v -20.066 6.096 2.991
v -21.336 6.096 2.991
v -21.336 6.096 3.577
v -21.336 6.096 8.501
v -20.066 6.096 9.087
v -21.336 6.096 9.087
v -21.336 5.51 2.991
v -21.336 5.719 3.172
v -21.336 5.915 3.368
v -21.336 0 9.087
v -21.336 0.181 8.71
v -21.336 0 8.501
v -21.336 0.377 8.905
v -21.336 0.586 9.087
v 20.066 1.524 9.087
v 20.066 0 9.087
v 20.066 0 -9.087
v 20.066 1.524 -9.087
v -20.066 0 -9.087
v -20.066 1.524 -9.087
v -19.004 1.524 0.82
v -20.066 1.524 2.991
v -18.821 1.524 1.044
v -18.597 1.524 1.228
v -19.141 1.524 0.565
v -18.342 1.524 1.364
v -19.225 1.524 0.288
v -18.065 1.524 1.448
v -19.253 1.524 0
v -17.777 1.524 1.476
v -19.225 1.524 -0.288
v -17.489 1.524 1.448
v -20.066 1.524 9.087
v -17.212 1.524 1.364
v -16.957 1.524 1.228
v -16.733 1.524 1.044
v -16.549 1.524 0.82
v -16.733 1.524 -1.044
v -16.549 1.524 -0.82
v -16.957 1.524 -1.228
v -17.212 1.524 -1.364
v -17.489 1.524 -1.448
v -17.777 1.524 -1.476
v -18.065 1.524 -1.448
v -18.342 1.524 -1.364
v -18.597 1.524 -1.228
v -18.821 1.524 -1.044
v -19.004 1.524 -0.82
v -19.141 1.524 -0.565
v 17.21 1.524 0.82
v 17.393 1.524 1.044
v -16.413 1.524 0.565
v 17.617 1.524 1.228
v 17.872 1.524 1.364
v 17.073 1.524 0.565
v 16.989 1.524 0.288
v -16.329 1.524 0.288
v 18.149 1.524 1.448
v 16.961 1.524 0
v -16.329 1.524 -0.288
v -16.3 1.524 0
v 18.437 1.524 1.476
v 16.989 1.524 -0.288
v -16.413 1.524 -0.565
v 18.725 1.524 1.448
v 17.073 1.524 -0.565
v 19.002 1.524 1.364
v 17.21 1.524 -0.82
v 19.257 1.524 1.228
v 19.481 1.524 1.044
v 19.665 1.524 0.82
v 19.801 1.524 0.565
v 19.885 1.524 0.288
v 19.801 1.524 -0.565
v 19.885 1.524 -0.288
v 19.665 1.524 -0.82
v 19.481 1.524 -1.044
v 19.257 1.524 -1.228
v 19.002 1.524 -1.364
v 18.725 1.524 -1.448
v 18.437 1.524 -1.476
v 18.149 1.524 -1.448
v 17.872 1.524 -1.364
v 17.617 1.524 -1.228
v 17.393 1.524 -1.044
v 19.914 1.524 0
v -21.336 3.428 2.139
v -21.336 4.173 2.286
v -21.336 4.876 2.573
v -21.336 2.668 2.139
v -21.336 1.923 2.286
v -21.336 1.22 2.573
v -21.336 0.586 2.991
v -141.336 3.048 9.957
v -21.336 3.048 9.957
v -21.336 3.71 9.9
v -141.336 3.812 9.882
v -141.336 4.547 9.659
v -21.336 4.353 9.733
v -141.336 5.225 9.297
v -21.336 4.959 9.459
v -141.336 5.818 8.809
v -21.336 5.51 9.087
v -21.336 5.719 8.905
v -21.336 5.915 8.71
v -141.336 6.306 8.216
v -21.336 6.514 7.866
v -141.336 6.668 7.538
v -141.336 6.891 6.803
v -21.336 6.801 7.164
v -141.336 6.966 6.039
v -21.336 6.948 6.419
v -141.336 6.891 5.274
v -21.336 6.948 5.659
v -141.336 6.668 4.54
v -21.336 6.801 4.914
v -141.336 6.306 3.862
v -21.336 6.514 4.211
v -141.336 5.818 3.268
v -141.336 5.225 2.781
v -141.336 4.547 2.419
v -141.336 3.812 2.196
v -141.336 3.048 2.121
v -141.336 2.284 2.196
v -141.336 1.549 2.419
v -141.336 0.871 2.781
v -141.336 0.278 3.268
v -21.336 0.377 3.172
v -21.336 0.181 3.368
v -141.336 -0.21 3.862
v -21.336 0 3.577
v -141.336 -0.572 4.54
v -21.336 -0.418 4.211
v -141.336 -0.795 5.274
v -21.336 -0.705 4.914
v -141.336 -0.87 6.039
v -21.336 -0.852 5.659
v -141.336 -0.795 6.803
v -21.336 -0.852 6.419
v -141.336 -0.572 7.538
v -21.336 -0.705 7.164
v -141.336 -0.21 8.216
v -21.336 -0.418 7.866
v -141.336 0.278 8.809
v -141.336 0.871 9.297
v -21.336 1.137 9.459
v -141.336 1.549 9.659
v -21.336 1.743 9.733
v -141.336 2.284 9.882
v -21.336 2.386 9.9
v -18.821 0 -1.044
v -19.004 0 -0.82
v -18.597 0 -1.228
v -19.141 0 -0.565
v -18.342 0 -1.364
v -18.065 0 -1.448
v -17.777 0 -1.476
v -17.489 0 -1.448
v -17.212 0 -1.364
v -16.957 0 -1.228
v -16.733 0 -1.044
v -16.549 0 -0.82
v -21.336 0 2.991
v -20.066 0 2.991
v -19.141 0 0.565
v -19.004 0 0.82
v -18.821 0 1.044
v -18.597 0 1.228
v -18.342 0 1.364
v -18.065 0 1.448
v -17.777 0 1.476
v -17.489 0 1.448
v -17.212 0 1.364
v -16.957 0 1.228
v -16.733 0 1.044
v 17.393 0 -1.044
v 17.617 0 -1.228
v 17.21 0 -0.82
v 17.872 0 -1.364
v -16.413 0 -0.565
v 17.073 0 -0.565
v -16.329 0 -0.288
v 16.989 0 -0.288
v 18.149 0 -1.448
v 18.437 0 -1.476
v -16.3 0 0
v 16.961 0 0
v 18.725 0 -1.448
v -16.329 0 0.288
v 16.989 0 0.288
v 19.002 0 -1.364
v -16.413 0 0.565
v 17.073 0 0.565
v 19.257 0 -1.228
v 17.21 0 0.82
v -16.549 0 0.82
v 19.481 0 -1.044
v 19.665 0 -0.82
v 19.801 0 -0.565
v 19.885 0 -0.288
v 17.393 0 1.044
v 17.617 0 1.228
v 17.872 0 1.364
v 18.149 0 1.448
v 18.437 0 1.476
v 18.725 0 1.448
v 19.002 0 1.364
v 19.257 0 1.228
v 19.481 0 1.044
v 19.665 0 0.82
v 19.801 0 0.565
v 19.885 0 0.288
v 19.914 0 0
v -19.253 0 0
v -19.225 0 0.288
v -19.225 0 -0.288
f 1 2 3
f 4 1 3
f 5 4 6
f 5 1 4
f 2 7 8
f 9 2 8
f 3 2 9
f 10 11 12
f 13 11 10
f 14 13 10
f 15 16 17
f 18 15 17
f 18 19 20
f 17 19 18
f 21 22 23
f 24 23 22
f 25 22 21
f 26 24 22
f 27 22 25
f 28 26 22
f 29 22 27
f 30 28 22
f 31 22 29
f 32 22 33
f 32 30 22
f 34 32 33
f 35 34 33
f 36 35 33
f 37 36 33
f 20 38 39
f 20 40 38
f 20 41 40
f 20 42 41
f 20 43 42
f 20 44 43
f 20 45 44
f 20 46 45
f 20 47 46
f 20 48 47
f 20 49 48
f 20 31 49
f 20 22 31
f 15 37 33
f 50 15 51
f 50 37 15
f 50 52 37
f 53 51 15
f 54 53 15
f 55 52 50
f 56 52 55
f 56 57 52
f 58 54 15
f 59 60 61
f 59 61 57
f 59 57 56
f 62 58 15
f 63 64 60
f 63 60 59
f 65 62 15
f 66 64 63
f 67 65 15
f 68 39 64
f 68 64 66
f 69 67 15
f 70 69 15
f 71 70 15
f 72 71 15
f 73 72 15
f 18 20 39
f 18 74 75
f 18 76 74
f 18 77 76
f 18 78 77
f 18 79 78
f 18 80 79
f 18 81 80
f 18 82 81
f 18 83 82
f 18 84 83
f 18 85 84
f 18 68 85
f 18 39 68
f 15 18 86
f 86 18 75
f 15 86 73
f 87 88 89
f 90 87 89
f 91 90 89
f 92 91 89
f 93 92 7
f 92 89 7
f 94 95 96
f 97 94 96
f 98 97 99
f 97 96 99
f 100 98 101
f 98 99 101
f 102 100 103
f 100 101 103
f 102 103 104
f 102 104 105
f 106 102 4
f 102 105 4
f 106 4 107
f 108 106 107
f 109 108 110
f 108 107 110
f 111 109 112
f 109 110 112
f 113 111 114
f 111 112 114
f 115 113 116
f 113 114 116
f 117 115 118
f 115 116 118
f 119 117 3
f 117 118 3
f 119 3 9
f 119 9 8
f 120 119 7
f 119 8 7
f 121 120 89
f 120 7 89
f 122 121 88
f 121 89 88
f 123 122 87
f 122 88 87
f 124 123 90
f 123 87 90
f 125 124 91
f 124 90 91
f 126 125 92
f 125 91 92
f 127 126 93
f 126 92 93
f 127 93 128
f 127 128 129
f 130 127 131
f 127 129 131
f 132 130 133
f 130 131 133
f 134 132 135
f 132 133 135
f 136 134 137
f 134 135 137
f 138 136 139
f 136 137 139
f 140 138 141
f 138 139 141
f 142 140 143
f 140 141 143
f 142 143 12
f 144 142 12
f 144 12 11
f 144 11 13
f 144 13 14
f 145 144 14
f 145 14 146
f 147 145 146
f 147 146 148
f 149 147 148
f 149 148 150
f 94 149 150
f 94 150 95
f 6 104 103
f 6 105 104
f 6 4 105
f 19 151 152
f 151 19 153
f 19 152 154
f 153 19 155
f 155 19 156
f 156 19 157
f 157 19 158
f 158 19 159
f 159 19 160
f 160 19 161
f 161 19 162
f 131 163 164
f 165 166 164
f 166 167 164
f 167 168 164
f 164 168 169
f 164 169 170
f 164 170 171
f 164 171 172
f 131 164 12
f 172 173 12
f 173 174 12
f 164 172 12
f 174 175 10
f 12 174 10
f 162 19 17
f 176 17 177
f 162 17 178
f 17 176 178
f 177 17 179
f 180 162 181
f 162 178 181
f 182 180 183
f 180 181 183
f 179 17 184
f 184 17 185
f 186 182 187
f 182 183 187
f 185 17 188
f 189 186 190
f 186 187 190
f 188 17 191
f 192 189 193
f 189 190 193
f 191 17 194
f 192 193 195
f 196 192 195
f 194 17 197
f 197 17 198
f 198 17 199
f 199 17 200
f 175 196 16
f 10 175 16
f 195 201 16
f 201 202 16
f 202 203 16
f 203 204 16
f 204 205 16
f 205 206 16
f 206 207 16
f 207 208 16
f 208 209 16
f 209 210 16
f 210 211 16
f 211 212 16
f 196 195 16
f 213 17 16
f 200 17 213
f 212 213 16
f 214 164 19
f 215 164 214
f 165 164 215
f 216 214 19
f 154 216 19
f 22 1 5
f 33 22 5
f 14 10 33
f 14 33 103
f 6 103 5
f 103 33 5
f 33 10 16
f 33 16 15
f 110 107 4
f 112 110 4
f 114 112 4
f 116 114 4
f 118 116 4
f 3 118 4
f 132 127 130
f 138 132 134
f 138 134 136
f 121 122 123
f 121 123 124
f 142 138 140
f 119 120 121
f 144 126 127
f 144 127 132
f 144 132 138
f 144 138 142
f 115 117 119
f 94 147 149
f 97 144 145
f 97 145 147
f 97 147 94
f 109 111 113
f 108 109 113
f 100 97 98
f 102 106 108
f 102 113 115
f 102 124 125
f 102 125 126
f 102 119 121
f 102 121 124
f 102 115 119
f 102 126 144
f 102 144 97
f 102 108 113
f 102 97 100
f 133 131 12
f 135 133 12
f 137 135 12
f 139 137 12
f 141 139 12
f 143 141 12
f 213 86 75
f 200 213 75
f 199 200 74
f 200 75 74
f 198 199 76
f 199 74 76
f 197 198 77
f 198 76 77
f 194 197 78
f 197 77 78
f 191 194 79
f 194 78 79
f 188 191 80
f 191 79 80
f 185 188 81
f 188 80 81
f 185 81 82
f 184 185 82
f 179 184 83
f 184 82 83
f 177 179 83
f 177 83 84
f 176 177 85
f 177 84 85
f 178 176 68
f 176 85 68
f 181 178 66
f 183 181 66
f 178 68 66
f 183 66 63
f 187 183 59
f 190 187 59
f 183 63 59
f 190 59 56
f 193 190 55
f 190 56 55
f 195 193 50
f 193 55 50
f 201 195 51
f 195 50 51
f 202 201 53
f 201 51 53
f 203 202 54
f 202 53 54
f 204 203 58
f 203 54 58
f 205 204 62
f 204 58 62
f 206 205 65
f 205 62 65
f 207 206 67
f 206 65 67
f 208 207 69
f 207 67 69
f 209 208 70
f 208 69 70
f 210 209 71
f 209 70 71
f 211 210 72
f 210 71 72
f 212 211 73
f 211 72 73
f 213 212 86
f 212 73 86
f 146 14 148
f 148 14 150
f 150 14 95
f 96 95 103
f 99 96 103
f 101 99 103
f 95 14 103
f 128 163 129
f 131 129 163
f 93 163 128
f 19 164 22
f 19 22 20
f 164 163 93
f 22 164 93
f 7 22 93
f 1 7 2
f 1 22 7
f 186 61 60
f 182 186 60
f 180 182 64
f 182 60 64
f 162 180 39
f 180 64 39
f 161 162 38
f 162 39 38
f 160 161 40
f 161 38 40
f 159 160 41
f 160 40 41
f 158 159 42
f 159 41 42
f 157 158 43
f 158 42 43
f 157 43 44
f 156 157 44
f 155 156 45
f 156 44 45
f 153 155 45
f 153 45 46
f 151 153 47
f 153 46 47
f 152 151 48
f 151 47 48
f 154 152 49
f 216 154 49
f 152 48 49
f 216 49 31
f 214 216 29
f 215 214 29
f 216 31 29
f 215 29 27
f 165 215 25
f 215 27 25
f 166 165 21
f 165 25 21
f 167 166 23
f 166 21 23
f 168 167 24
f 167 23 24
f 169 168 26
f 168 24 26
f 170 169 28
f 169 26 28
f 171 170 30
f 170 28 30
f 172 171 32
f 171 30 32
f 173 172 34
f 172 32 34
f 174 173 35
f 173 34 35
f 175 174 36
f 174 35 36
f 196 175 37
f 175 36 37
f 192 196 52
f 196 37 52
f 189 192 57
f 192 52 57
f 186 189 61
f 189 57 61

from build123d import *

# Parameters (mm, degrees)
SKETCH1_W           = 40.132
SKETCH1_H           = 18.1737
PCB_BOARD_DEPTH     = 1.524
SKETCH2_W           = 6.096
SKETCH2_H           = 6.096
BOSS_EXTRUDE1_DEPTH = 1.27
SKETCH3_R           = 3.91795
BOSS_EXTRUDE2_DEPTH = 120
SKETCH4_R           = 1.476375
CUT_EXTRUDE1_DEPTH  = 1.524


with BuildPart() as part:
    # Sketch1 → PCB board (new body)
    with BuildSketch(Plane(origin=(0, 0, 0), x_dir=(1, 0, 0), z_dir=(0, 1, 0))):
        Rectangle(SKETCH1_W, SKETCH1_H)
    extrude(amount=PCB_BOARD_DEPTH)

    # Sketch2 → Boss-Extrude1 (add)
    with BuildSketch(Plane.ZY.offset(20.066)):
        with Locations((6.03885, 3.048)):
            Rectangle(SKETCH2_W, SKETCH2_H)
    extrude(amount=BOSS_EXTRUDE1_DEPTH)

    # Sketch3 → Boss-Extrude2 (add)
    with BuildSketch(Plane.ZY.offset(21.336)):
        with Locations((6.03885, 3.048)):
            Circle(SKETCH3_R)
    extrude(amount=BOSS_EXTRUDE2_DEPTH)

    # Sketch4 → Cut-Extrude1 (cut)
    with BuildSketch(Plane(origin=(0, 1.524, 0), x_dir=(1, 0, 0), z_dir=(0, 1, 0))):
        with Locations((-17.776825, 0)):
            Circle(SKETCH4_R)
        with Locations((18.437225, 0)):
            Circle(SKETCH4_R)
    extrude(amount=-CUT_EXTRUDE1_DEPTH, mode=Mode.SUBTRACT)


solid = part.part
